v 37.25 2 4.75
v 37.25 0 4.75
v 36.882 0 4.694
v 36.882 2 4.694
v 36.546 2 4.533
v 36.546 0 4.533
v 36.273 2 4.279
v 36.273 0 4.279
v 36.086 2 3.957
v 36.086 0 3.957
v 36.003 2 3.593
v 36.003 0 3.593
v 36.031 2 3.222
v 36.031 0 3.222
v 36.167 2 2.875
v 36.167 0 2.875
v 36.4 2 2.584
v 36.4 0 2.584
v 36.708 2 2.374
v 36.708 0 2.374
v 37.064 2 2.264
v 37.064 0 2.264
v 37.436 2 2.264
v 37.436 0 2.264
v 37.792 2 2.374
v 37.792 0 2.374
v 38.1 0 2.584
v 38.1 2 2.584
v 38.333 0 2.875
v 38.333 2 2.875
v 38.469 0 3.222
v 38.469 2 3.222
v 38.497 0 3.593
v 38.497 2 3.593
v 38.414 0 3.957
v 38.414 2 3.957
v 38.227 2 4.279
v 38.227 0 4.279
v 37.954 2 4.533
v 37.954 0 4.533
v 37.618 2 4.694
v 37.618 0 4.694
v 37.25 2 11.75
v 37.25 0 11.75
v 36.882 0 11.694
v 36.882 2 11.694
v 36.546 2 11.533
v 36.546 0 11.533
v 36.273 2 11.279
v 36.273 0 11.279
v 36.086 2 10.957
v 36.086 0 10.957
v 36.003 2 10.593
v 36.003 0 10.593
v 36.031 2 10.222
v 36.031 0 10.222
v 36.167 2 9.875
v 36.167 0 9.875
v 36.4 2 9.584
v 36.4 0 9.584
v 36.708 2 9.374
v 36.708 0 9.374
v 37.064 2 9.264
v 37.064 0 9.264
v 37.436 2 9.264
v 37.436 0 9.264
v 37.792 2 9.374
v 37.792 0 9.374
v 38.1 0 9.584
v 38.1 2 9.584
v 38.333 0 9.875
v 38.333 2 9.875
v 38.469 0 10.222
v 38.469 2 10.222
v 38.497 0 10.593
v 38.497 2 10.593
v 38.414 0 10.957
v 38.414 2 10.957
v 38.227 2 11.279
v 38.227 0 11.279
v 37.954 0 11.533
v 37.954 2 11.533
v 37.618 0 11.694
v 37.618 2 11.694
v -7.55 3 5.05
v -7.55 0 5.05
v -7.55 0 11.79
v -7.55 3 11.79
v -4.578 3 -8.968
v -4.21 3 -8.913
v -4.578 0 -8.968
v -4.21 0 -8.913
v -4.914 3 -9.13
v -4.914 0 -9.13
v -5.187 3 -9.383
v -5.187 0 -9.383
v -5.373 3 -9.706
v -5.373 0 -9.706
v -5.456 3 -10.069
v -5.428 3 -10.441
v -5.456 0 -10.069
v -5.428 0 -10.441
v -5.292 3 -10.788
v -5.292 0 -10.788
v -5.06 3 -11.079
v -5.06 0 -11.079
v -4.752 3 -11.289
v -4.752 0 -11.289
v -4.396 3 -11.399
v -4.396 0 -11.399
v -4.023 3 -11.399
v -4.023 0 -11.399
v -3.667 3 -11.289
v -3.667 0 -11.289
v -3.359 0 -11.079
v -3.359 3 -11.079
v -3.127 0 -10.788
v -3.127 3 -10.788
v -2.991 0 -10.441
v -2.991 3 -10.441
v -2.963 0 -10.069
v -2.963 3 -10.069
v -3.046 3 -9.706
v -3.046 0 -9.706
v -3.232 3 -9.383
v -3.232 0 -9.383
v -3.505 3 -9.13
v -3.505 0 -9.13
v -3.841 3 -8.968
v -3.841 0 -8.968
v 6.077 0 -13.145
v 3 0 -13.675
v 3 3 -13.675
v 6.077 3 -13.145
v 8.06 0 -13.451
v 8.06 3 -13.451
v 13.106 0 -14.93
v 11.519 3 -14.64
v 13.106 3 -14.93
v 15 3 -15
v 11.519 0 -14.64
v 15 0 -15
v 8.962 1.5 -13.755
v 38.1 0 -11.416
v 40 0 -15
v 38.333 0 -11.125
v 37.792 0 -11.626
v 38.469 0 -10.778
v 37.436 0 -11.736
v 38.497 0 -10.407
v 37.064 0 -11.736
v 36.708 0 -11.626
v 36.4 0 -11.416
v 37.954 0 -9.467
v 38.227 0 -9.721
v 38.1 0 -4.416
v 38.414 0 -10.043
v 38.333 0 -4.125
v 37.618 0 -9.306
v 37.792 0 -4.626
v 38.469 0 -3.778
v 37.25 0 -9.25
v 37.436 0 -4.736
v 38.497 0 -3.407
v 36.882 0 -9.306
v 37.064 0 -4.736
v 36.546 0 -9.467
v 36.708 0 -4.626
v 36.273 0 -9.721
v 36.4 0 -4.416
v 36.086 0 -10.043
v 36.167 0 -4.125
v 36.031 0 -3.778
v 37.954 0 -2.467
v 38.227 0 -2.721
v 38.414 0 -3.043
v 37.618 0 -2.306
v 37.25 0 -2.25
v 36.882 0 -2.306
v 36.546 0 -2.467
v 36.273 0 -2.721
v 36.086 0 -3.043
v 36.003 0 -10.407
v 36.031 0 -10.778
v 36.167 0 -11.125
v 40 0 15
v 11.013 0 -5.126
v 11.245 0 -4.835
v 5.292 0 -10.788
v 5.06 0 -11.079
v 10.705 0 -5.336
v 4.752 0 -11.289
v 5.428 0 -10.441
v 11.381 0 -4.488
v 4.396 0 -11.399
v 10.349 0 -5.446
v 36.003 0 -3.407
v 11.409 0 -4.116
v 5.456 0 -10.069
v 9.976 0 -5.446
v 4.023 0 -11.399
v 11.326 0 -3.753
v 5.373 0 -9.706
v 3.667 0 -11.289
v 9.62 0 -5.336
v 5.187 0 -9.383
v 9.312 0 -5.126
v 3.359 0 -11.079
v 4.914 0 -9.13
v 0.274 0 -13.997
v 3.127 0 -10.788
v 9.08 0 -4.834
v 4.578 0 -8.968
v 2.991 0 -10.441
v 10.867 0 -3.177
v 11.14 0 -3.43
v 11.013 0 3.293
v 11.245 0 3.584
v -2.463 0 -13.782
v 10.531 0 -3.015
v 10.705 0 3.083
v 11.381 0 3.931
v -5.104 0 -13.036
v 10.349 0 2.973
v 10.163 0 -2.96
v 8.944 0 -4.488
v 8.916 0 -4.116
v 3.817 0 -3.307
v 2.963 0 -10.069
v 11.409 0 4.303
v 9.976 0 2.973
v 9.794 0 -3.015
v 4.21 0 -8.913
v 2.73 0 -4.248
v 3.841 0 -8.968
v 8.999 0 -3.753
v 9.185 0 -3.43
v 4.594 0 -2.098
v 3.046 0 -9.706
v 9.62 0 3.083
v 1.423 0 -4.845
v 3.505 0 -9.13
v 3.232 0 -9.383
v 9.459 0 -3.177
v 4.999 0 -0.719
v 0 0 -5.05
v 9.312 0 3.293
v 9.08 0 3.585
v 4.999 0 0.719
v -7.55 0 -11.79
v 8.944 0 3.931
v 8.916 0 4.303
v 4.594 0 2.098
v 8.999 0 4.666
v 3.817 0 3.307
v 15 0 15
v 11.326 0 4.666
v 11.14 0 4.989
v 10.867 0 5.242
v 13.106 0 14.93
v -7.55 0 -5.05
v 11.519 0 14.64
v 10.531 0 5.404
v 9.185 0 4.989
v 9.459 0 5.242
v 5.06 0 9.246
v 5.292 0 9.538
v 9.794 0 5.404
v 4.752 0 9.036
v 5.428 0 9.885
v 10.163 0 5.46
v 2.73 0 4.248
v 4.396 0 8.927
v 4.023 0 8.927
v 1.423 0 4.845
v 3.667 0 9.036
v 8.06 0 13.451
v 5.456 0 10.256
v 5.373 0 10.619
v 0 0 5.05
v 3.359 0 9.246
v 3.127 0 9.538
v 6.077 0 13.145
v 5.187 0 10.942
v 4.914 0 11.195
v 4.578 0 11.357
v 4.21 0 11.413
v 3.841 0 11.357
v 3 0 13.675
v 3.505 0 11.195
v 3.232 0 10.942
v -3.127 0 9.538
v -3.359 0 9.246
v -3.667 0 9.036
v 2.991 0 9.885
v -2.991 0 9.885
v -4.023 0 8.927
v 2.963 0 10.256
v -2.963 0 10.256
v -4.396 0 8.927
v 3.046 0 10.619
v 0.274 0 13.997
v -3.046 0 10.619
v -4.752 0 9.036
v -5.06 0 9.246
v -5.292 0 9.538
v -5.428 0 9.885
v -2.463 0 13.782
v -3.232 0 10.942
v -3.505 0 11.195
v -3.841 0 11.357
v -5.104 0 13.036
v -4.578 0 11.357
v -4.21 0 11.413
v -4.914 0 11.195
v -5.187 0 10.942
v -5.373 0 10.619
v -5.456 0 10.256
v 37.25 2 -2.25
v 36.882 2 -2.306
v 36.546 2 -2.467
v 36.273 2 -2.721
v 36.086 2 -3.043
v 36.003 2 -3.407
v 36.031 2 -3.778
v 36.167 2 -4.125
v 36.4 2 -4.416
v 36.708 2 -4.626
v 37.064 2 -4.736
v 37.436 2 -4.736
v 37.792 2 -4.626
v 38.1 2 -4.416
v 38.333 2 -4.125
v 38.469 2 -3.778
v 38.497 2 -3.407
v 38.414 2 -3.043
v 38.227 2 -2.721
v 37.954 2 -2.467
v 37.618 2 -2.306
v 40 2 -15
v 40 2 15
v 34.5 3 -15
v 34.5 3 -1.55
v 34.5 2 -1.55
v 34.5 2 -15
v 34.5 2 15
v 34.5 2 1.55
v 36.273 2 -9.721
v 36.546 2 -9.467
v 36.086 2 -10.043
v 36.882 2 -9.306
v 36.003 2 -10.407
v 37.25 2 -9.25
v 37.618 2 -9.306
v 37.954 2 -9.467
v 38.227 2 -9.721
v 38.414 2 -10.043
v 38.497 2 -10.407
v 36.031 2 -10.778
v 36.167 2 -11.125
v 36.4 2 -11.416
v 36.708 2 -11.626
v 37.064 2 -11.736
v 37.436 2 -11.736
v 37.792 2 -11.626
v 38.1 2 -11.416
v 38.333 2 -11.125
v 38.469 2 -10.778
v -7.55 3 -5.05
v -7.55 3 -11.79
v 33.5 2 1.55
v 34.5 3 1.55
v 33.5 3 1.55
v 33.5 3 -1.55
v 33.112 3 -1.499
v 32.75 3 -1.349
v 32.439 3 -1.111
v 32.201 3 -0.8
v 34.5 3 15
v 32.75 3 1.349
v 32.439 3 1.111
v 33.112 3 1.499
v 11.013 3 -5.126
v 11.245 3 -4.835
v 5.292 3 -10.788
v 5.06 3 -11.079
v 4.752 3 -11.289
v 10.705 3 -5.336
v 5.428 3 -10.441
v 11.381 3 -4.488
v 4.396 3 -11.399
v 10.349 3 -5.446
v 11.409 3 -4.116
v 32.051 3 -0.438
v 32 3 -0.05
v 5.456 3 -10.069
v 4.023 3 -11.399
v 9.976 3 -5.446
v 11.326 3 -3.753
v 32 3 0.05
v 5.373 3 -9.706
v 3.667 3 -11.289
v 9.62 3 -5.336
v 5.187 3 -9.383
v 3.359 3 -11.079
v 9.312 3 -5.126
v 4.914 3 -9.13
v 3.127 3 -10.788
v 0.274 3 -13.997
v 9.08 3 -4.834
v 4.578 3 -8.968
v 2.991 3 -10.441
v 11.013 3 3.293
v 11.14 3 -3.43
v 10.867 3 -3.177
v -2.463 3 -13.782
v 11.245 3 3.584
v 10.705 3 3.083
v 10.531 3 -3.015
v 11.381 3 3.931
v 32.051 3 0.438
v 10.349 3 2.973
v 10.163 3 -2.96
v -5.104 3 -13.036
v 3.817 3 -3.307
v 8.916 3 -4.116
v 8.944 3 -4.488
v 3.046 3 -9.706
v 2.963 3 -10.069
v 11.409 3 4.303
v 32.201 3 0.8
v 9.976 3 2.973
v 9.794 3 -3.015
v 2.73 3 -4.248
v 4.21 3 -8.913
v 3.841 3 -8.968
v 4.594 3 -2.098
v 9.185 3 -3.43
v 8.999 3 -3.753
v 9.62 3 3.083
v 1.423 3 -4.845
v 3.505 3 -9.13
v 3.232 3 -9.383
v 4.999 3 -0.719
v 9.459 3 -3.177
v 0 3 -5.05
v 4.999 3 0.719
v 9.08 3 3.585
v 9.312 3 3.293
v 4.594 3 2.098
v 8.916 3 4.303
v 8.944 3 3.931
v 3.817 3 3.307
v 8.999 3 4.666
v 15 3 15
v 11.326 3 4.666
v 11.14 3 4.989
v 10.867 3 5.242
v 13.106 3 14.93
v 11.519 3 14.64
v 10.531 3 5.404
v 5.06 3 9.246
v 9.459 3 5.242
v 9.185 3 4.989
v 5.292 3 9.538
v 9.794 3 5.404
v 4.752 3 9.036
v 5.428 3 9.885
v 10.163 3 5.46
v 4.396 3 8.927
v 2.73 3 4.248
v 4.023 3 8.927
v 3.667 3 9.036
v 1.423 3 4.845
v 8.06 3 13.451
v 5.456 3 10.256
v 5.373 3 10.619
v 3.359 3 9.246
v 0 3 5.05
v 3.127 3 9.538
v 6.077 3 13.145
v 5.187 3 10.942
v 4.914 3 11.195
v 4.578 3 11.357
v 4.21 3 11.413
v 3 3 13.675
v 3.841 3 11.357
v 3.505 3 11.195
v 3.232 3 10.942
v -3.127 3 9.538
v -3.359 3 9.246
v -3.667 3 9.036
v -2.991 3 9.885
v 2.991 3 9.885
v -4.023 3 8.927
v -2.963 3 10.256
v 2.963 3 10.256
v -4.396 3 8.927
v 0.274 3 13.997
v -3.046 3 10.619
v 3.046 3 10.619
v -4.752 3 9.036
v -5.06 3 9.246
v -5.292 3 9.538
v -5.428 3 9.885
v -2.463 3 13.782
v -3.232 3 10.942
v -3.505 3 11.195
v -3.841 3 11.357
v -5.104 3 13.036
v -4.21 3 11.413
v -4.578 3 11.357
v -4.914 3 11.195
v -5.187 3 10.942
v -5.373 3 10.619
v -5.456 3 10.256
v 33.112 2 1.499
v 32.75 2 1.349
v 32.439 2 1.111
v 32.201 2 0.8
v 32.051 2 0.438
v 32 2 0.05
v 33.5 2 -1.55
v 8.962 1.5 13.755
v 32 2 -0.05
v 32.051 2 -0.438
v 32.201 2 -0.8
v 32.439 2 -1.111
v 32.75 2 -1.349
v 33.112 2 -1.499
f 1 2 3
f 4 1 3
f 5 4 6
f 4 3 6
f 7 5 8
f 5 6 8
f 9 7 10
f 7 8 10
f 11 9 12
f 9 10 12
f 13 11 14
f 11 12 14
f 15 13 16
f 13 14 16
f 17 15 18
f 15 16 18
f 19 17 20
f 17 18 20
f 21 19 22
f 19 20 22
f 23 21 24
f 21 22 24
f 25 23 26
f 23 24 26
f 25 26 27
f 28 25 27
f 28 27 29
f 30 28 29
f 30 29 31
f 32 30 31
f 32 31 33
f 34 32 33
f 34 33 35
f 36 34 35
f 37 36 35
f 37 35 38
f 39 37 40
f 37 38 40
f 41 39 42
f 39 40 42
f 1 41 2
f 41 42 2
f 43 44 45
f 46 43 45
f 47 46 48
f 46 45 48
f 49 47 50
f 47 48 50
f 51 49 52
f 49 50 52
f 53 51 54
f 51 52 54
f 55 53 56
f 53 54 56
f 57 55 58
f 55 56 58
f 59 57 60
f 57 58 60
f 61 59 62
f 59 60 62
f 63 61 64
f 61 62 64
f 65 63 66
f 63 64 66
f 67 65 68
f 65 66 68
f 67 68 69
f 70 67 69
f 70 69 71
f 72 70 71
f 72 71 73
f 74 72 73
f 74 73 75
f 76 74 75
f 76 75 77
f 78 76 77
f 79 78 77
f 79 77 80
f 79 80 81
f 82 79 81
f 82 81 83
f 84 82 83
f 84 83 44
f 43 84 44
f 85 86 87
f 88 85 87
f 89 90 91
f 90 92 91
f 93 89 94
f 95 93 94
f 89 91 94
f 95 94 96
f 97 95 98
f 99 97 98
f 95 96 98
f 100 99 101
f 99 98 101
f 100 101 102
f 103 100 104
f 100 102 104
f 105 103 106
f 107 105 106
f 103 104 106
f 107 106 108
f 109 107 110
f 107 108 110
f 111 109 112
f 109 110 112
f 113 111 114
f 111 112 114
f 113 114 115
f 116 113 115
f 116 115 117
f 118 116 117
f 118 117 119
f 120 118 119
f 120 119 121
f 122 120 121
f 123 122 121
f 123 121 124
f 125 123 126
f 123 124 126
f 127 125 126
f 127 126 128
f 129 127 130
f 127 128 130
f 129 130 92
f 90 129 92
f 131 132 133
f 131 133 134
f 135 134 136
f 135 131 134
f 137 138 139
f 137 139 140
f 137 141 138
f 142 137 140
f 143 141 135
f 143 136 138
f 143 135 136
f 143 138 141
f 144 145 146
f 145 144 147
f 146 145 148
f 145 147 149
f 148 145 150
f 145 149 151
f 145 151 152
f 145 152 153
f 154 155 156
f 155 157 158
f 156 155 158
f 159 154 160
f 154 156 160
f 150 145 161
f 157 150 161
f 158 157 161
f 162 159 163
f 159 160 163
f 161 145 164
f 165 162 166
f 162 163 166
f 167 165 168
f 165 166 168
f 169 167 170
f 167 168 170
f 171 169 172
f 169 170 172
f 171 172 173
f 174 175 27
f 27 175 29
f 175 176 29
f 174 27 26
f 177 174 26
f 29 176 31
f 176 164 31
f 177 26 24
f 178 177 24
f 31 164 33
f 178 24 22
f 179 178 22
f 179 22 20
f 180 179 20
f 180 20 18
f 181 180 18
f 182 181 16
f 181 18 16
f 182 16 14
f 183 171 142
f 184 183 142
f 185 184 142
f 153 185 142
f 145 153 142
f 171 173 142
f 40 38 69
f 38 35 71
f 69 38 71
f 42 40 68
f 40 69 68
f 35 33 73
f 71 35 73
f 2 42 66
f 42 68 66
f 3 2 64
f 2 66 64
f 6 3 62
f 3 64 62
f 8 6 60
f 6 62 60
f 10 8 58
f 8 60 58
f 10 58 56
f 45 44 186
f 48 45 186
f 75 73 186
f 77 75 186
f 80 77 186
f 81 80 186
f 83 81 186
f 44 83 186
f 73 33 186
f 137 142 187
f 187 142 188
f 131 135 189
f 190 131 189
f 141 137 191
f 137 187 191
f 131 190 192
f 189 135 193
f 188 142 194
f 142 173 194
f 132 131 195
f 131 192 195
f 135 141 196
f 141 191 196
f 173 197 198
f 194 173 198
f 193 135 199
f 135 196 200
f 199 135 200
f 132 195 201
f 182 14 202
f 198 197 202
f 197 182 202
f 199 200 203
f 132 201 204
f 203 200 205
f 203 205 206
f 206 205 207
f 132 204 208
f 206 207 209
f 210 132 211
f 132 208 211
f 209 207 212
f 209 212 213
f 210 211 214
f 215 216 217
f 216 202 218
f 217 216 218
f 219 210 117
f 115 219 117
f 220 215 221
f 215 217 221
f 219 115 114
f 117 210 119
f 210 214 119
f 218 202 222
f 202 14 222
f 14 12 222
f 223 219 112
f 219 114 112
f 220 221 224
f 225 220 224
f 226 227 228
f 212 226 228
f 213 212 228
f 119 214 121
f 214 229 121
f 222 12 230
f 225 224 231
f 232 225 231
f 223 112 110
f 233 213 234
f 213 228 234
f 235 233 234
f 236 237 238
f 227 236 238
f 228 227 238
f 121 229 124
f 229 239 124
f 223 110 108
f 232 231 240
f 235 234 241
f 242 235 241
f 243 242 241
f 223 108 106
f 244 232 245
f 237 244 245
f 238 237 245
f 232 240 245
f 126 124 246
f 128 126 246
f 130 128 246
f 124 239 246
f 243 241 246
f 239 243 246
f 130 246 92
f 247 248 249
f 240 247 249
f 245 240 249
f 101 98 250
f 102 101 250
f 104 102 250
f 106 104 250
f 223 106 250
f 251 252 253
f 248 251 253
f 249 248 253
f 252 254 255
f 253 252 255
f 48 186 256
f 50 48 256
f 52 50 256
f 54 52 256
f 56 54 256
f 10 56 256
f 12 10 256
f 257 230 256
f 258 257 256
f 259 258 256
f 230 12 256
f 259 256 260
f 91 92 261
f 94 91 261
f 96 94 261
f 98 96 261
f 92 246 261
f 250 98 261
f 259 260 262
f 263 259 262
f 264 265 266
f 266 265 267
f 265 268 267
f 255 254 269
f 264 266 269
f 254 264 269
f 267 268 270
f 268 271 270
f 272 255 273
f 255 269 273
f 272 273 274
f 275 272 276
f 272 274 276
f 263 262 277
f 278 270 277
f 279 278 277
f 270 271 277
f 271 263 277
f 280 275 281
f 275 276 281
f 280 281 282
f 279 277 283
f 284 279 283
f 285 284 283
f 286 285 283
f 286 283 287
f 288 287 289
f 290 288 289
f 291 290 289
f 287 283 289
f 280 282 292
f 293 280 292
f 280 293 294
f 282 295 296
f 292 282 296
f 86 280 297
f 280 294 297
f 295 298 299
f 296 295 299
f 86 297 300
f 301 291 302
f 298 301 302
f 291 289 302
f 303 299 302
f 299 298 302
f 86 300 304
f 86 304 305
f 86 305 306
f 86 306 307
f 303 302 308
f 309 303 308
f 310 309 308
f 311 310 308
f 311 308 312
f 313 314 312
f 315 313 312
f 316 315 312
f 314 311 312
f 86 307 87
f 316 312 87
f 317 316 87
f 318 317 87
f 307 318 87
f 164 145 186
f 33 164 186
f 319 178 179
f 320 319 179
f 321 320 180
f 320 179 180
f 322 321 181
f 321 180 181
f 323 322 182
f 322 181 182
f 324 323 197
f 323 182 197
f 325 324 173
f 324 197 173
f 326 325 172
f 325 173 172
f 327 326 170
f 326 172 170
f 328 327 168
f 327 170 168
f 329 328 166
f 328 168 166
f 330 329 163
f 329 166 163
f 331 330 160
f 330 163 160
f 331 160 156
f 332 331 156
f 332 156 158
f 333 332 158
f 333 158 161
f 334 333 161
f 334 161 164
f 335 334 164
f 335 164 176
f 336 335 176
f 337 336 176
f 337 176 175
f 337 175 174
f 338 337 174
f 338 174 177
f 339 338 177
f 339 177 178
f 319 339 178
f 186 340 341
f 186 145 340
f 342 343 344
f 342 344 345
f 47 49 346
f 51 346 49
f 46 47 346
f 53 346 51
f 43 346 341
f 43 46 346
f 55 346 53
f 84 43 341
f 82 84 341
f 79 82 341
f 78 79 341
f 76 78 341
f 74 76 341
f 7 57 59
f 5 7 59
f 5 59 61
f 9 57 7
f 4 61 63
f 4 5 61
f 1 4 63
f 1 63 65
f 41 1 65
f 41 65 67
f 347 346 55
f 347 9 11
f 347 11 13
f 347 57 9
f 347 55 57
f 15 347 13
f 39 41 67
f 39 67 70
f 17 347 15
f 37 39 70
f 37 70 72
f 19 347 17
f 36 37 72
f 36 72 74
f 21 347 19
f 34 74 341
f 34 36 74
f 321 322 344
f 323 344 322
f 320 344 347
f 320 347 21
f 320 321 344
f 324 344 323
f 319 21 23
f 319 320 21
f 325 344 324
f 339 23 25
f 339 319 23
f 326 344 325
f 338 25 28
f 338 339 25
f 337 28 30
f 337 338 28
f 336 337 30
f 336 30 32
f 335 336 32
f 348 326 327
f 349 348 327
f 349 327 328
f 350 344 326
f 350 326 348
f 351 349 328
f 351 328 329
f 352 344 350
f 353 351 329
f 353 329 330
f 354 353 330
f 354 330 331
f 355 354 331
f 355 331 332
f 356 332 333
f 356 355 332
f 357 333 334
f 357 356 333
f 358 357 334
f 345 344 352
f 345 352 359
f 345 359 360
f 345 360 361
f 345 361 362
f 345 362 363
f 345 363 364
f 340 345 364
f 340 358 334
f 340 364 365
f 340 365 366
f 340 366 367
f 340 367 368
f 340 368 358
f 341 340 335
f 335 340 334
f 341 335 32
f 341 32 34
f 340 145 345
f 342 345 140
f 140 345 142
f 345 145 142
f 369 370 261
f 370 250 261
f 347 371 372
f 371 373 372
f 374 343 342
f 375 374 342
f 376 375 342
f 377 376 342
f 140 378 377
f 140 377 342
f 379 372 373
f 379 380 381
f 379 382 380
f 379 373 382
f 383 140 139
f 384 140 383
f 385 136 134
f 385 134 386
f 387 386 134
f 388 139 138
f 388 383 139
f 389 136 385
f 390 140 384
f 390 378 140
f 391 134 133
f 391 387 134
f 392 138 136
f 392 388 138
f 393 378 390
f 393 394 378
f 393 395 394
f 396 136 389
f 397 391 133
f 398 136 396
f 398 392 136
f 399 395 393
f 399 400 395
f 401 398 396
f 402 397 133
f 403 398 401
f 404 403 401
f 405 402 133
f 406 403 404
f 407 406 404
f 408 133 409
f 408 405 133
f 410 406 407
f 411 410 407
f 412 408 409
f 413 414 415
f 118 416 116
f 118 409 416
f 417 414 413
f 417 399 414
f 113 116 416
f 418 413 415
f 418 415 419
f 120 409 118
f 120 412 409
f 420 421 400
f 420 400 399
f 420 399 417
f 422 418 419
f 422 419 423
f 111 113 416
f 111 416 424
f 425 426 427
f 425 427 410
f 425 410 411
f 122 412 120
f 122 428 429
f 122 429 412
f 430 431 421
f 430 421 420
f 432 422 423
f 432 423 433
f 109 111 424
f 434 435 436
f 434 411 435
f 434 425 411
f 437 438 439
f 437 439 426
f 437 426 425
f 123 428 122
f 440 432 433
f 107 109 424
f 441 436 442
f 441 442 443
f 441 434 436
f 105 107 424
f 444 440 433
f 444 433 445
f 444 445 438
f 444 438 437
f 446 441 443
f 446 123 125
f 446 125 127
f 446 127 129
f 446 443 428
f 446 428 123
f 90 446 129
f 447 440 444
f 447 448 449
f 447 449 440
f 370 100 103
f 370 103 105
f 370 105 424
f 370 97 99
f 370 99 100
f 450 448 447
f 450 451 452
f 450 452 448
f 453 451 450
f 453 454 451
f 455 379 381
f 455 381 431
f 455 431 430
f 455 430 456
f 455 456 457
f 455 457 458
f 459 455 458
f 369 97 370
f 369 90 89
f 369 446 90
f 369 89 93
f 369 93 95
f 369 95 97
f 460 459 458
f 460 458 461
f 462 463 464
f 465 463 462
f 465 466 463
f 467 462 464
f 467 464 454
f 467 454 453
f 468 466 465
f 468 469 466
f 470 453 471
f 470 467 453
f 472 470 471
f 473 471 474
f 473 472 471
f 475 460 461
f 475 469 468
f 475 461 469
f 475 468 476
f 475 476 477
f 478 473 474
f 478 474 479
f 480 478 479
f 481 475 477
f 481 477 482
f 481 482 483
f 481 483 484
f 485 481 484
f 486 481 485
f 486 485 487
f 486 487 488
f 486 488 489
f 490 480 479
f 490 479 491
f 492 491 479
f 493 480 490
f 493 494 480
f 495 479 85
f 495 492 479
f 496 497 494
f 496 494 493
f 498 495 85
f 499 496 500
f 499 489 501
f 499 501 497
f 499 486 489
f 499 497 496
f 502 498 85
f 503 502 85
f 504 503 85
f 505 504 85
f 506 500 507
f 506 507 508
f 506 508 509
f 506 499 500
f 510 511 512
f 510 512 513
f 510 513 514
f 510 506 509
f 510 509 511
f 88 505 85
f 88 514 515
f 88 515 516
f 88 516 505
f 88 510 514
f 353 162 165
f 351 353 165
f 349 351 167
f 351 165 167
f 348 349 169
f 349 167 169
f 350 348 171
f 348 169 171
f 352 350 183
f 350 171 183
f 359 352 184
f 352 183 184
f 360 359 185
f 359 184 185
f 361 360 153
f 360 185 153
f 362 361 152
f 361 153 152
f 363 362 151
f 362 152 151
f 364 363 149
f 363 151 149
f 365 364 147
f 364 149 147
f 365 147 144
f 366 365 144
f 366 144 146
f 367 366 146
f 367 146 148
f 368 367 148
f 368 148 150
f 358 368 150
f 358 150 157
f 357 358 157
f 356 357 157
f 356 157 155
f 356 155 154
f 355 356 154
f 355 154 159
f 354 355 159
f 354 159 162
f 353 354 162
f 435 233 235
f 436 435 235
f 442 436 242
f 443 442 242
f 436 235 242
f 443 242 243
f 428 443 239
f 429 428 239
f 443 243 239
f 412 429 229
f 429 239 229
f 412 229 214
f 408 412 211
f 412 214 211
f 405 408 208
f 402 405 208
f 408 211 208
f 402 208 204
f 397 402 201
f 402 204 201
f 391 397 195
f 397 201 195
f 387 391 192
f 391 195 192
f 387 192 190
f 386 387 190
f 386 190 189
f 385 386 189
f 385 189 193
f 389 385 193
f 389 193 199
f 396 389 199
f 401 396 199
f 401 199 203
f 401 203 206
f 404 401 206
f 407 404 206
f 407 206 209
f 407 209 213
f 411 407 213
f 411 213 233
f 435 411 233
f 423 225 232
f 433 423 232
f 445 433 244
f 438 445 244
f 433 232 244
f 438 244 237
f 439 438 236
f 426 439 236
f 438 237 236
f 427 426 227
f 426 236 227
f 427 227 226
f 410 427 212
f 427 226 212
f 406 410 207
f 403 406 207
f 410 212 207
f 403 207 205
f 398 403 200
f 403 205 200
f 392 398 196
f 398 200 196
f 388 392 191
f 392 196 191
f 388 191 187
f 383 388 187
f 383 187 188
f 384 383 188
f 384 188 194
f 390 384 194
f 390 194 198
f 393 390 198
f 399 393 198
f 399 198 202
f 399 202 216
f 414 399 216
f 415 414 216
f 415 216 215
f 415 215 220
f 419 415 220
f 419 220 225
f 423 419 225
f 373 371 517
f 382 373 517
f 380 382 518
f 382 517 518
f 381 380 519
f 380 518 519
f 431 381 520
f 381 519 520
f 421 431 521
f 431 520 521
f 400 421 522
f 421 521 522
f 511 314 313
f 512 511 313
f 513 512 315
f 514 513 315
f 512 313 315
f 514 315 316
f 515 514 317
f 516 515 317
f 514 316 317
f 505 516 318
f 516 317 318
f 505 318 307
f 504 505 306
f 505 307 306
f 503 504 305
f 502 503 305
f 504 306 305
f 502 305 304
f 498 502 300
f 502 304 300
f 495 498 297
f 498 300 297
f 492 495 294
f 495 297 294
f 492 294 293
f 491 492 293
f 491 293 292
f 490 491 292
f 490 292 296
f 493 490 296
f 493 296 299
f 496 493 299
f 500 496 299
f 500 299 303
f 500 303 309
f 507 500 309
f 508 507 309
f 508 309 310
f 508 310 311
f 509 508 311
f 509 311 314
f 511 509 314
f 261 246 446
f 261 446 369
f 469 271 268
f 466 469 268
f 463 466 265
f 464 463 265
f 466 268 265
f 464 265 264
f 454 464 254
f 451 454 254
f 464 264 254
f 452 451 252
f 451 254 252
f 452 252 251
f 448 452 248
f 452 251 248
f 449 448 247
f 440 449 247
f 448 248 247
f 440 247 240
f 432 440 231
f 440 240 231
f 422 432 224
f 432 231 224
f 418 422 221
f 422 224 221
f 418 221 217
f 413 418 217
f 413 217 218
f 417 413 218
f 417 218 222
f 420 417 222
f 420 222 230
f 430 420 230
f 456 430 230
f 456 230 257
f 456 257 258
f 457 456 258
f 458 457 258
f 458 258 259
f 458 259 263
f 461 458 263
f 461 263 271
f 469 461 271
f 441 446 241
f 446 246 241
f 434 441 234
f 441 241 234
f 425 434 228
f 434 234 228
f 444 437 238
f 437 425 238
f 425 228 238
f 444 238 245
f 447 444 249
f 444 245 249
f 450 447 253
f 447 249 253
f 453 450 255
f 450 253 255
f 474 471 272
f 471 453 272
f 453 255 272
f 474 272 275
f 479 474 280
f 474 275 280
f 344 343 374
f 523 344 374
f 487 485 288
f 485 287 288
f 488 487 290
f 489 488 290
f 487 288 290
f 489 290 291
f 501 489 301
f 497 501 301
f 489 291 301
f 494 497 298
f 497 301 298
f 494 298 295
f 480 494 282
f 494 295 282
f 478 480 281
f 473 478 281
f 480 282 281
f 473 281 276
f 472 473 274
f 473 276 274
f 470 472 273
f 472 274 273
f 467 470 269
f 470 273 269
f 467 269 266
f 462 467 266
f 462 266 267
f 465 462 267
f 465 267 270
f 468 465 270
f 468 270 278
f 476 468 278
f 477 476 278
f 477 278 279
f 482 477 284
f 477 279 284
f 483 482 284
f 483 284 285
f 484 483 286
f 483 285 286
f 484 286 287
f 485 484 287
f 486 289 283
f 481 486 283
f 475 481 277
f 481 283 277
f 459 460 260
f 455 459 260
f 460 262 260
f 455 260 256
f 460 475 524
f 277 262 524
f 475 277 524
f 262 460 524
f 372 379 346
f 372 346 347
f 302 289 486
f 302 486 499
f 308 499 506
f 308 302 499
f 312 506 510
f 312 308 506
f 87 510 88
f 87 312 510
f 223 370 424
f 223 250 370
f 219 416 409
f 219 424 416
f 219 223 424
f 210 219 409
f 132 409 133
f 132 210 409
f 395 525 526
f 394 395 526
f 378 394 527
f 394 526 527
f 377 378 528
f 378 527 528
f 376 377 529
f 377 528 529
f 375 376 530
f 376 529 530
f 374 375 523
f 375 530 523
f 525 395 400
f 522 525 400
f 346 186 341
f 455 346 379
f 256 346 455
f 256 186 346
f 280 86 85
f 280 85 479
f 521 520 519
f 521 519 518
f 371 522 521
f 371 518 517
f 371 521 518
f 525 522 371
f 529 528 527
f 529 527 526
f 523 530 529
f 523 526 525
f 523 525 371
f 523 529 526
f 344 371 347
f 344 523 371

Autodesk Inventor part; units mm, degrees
ref_plane "YZ Plane" through (0, 0, 0) normal (1, 0, 0) x (0, 1, 0)
ref_plane "XZ Plane" through (0, 0, 0) normal (0, 1, 0) x (-1, 0, 0)
sketch "Sketch1" plane through (0, 0, 0) normal (0, 1, 0) x (-1, 0, 0)
  line L0 (-40, 15) -> (0, 15) construction
  line L1 (15, 15) -> (15, -15) construction
  line L2 (15, -15) -> (0, -15) construction
  line L3 (-40, -15) -> (-40, 15)
  line L4 (15, 0) -> (-40, 0) construction
  line L5 (-28.4, 0) -> (23.4, 0) construction
  circle A0 centre (0, 0) radius 11 construction
  line L6 (11, 15) -> (11, -15) construction
  circle A1 centre (0, 0) radius 5.05 construction
  line L7 (0, 5.05) -> (7.55, 5.05) construction
  line L8 (0, -5.05) -> (7.55, -5.05) construction
  line L9 (15, 15) -> (15, 5) construction
  line L10 (15, -5) -> (15, -15) construction
  arc A2 (0, 5.05) -> (0, -5.05) centre (0, 0) ccw
  circle A3 centre (0, 0) radius 15 construction
  arc A4 (0, -15) -> (14.1421, -5) centre (0, 0) ccw construction
  arc A5 (14.1421, 5) -> (0, 15) centre (0, 0) ccw construction
  line L11 (0, -15) -> (-40, -15) construction
  line L12 (0, 15) -> (15, 15) construction
  arc A6 (11, -8.6603) -> (11, 8.6603) centre (0, 0) ccw construction
  line L13 (-3, -15) -> (-3, 15) construction
  arc A7 (-3, -13.6748) -> (7.55, -11.7897) centre (0, 0) ccw
  line L14 (7.55, 5.05) -> (0, 5.05)
  line L15 (-15, -18.6523) -> (-15, 18.2394) construction
  line L16 (-40, -15) -> (-15, -15)
  line L17 (-40, 15) -> (-15, 15)
  spline S0 degree 4 poles (-3, -13.6748) (-4.5129, -13.3429) (-7.4407, -12.2328) (-10.459, -15) (-13.4863, -15) (-15, -15) knots 0 0 0 0 0 0.5 1 1 1 1 1
  spline S1 degree 4 poles (-3, 13.6748) (-4.5129, 13.3429) (-7.4407, 12.2328) (-10.459, 15) (-13.4863, 15) (-15, 15) knots 0 0 0 0 0 0.5 1 1 1 1 1
  line L18 (5.05, -15) -> (5.05, 15) construction
  line L19 (7.55, -11.7897) -> (7.55, -5.05)
  line L20 (7.55, 5.05) -> (7.55, 11.7897)
  line L21 (7.55, -5.05) -> (11, -5.05) construction
  line L22 (7.55, 5.05) -> (9.7723, 5.05) construction
  arc A8 (7.55, 11.7897) -> (7.55, -11.7897) centre (0, 0) ccw construction
  arc A9 (7.55, 11.7897) -> (-3, 13.6748) centre (0, 0) ccw
  line L23 (0, -5.05) -> (7.55, -5.05)
  line L24 (0, -26.0306) -> (0, 25.6178) construction
  line L25 (35.28, 0) -> (-47.88, 0) construction
  point P0 (13.0767, -5)
  dimension "d1" = 22
  dimension "d0" = 30
  dimension "d2" = 40
  dimension "d3" = 10.1
  dimension "d4" = 30
  dimension "d5" = 28
  dimension "d6" = 15
  dimension "d7" = 12
  dimension "d8" = 2.5
extrude "Extrusion1" add sketch "Sketch1" along normal blind 3
sketch "Sketch2" plane through (0, 3, 0) normal (0, 1, 0) x (1, 0, 0)
  circle A0 centre (0, 0) radius 11 construction
  line L0 (-21.2, 0) -> (50.2, 0) construction
  line L1 (0, 21) -> (0, -21) construction
  line L2 (0, 0) -> (-4.2095, -10.1627) construction
  point P0 (-4.2095, -10.1627)
  point P1 (4.2095, -10.1627)
  point P2 (10.1627, -4.2095)
  point P3 (10.1627, 4.2095)
  point P4 (4.2095, 10.1627)
  point P5 (-4.2095, 10.1627)
  dimension "d19" = 22
  dimension "d20" = 225
  dimension "d68" = 22.5
hole "Hole1" at (-4.2095, 3, 10.1627) at (-4.2095, 3, -10.1627) at (4.2095, 3, -10.1627) at (10.1627, 3, -4.2095) at (10.1627, 3, 4.2095) at (4.2095, 3, 10.1627) direction (0, -1, 0) diameter 2.5 end through all
sketch "Sketch3" plane through (0, 3, 0) normal (0, 1, 0) x (1, 0, 0)
  circle A0 centre (-4.2095, -10.1627) radius 1.25 construction
  circle A1 centre (4.2095, -10.1627) radius 1.25 construction
  circle A2 centre (10.1627, -4.2095) radius 1.25 construction
  circle A3 centre (10.1627, 4.2095) radius 1.25 construction
  circle A4 centre (4.2095, 10.1627) radius 1.25 construction
  circle A5 centre (-4.2095, 10.1627) radius 1.25 construction
  point P0 (0, 0)
sketch "Sketch4" plane through (0, 3, 0) normal (0, 1, 0) x (1, 0, 0)
  line L0 (37, -21.9283) -> (37, 20.7608) construction
  line L1 (40, -15) -> (40, 15) construction
  line L2 (15, -15) -> (40, -15) construction
  point P0 (0, 0)
  point P1 (37, -10.5)
  point P2 (37, -3.5)
  point P3 (37, 3.5)
  point P4 (37, 10.5)
  dimension "d29" = 3
  dimension "d30" = 4.5
  dimension "d33" = 7
hole "Hole2" [suppressed]
sketch "Sketch6" plane through (0, 3, 0) normal (0, 1, 0) x (1, 0, 0)
  line L0 (15, -15) -> (40, -15) projected
  line L1 (40, -15) -> (34.5, -15)
  line L2 (34.5, -15) -> (34.5, 15)
  line L3 (34.5, 15) -> (40, 15)
  line L4 (40, 15) -> (40, -15)
  line L5 (37.25, 15) -> (37.25, -15) construction
  point P0 (0, 0)
  point P1 (37.25, -10.5)
  point P2 (37.25, -3.5)
  point P3 (37.25, 3.5)
  point P4 (37.25, 10.5)
  dimension "d47" = 5.5
  dimension "d55" = 30
  dimension "d56" = 7
  dimension "d57" = 7
  dimension "d58" = 7
  dimension "d59" = 4.5
  dimension "d60" = 4.5
extrude "Extrusion2" cut sketch "Sketch6" against normal blind 1
sketch "Sketch7" plane through (0, 3, 0) normal (0, 1, 0) x (1, 0, 0)
  line L0 (34.5, -15) -> (34.5, 15) projected
  line L1 (34.5, 15) -> (15, 15) projected
  arc A0 (3, 13.6748) -> (-7.55, 11.7897) centre (0, 0) ccw projected
  line L2 (-7.55, 11.7897) -> (-7.55, 5.05) projected
  line L3 (-7.55, 5.05) -> (0, 5.05) projected
  arc A1 (0, -5.05) -> (0, 5.05) centre (0, 0) ccw projected
  line L4 (0, -5.05) -> (-7.55, -5.05) projected
  line L5 (-7.55, -5.05) -> (-7.55, -11.7897) projected
  arc A2 (-7.55, -11.7897) -> (3, -13.6748) centre (0, 0) ccw projected
  line L6 (15, -15) -> (34.5, -15) projected
  circle A3 centre (10.1627, -4.2095) radius 1.25 projected
  circle A4 centre (4.2095, 10.1627) radius 1.25 projected
  circle A5 centre (-4.2095, -10.1627) radius 1.25 projected
  circle A6 centre (-4.2095, 10.1627) radius 1.25 projected
  circle A7 centre (10.1627, 4.2095) radius 1.25 projected
  circle A8 centre (4.2095, -10.1627) radius 1.25 projected
  line L7 (34.5, 1.55) -> (32, 1.55)
  line L8 (32, 1.55) -> (32, -1.55)
  line L9 (32, -1.55) -> (34.5, -1.55)
  line L10 (34.5, 0) -> (32, 0) construction
  point P0 (0, 0)
  dimension "d50" = 3.1
  dimension "d51" = 2.5
extrude "Extrusion3" cut sketch "Sketch7" against normal blind 1 contours L9 L8 L7 L0
fillet "Fillet1" radius 1.5 2 edges at (32, 2.5, 1.55) (32, 2.5, -1.55)
hole "Hole3" at (37.25, 3, -10.5) at (37.25, 3, -3.5) at (37.25, 3, 3.5) at (37.25, 3, 10.5) direction (0, -1, 0) diameter 2.5 end through all
ref_plane "Work Plane1" through (45, 0, 15) normal (1, 0, 0) x (0, 0, -1)
equation "\"d2\" = base_2_axis"
equation "\"d3\" = horn_radius_clearance"
equation "\"d19\" = d21"
equation "\"d47\" = base_border_height"
equation "\"d9\" = 30"
equation "\"d10\" = 22"
equation "\"horn_radius_clearance\" = 10.1"
equation "\"d14\" = 2 * d13"
equation "\"d21\" = 22"
equation "\"base_2_axis\" = 40"
equation "\"base_border_height\" = 5.5"
equation "\"d13\" = 3"
properties part number "test_side_u64" material "Aluminum 6061"
